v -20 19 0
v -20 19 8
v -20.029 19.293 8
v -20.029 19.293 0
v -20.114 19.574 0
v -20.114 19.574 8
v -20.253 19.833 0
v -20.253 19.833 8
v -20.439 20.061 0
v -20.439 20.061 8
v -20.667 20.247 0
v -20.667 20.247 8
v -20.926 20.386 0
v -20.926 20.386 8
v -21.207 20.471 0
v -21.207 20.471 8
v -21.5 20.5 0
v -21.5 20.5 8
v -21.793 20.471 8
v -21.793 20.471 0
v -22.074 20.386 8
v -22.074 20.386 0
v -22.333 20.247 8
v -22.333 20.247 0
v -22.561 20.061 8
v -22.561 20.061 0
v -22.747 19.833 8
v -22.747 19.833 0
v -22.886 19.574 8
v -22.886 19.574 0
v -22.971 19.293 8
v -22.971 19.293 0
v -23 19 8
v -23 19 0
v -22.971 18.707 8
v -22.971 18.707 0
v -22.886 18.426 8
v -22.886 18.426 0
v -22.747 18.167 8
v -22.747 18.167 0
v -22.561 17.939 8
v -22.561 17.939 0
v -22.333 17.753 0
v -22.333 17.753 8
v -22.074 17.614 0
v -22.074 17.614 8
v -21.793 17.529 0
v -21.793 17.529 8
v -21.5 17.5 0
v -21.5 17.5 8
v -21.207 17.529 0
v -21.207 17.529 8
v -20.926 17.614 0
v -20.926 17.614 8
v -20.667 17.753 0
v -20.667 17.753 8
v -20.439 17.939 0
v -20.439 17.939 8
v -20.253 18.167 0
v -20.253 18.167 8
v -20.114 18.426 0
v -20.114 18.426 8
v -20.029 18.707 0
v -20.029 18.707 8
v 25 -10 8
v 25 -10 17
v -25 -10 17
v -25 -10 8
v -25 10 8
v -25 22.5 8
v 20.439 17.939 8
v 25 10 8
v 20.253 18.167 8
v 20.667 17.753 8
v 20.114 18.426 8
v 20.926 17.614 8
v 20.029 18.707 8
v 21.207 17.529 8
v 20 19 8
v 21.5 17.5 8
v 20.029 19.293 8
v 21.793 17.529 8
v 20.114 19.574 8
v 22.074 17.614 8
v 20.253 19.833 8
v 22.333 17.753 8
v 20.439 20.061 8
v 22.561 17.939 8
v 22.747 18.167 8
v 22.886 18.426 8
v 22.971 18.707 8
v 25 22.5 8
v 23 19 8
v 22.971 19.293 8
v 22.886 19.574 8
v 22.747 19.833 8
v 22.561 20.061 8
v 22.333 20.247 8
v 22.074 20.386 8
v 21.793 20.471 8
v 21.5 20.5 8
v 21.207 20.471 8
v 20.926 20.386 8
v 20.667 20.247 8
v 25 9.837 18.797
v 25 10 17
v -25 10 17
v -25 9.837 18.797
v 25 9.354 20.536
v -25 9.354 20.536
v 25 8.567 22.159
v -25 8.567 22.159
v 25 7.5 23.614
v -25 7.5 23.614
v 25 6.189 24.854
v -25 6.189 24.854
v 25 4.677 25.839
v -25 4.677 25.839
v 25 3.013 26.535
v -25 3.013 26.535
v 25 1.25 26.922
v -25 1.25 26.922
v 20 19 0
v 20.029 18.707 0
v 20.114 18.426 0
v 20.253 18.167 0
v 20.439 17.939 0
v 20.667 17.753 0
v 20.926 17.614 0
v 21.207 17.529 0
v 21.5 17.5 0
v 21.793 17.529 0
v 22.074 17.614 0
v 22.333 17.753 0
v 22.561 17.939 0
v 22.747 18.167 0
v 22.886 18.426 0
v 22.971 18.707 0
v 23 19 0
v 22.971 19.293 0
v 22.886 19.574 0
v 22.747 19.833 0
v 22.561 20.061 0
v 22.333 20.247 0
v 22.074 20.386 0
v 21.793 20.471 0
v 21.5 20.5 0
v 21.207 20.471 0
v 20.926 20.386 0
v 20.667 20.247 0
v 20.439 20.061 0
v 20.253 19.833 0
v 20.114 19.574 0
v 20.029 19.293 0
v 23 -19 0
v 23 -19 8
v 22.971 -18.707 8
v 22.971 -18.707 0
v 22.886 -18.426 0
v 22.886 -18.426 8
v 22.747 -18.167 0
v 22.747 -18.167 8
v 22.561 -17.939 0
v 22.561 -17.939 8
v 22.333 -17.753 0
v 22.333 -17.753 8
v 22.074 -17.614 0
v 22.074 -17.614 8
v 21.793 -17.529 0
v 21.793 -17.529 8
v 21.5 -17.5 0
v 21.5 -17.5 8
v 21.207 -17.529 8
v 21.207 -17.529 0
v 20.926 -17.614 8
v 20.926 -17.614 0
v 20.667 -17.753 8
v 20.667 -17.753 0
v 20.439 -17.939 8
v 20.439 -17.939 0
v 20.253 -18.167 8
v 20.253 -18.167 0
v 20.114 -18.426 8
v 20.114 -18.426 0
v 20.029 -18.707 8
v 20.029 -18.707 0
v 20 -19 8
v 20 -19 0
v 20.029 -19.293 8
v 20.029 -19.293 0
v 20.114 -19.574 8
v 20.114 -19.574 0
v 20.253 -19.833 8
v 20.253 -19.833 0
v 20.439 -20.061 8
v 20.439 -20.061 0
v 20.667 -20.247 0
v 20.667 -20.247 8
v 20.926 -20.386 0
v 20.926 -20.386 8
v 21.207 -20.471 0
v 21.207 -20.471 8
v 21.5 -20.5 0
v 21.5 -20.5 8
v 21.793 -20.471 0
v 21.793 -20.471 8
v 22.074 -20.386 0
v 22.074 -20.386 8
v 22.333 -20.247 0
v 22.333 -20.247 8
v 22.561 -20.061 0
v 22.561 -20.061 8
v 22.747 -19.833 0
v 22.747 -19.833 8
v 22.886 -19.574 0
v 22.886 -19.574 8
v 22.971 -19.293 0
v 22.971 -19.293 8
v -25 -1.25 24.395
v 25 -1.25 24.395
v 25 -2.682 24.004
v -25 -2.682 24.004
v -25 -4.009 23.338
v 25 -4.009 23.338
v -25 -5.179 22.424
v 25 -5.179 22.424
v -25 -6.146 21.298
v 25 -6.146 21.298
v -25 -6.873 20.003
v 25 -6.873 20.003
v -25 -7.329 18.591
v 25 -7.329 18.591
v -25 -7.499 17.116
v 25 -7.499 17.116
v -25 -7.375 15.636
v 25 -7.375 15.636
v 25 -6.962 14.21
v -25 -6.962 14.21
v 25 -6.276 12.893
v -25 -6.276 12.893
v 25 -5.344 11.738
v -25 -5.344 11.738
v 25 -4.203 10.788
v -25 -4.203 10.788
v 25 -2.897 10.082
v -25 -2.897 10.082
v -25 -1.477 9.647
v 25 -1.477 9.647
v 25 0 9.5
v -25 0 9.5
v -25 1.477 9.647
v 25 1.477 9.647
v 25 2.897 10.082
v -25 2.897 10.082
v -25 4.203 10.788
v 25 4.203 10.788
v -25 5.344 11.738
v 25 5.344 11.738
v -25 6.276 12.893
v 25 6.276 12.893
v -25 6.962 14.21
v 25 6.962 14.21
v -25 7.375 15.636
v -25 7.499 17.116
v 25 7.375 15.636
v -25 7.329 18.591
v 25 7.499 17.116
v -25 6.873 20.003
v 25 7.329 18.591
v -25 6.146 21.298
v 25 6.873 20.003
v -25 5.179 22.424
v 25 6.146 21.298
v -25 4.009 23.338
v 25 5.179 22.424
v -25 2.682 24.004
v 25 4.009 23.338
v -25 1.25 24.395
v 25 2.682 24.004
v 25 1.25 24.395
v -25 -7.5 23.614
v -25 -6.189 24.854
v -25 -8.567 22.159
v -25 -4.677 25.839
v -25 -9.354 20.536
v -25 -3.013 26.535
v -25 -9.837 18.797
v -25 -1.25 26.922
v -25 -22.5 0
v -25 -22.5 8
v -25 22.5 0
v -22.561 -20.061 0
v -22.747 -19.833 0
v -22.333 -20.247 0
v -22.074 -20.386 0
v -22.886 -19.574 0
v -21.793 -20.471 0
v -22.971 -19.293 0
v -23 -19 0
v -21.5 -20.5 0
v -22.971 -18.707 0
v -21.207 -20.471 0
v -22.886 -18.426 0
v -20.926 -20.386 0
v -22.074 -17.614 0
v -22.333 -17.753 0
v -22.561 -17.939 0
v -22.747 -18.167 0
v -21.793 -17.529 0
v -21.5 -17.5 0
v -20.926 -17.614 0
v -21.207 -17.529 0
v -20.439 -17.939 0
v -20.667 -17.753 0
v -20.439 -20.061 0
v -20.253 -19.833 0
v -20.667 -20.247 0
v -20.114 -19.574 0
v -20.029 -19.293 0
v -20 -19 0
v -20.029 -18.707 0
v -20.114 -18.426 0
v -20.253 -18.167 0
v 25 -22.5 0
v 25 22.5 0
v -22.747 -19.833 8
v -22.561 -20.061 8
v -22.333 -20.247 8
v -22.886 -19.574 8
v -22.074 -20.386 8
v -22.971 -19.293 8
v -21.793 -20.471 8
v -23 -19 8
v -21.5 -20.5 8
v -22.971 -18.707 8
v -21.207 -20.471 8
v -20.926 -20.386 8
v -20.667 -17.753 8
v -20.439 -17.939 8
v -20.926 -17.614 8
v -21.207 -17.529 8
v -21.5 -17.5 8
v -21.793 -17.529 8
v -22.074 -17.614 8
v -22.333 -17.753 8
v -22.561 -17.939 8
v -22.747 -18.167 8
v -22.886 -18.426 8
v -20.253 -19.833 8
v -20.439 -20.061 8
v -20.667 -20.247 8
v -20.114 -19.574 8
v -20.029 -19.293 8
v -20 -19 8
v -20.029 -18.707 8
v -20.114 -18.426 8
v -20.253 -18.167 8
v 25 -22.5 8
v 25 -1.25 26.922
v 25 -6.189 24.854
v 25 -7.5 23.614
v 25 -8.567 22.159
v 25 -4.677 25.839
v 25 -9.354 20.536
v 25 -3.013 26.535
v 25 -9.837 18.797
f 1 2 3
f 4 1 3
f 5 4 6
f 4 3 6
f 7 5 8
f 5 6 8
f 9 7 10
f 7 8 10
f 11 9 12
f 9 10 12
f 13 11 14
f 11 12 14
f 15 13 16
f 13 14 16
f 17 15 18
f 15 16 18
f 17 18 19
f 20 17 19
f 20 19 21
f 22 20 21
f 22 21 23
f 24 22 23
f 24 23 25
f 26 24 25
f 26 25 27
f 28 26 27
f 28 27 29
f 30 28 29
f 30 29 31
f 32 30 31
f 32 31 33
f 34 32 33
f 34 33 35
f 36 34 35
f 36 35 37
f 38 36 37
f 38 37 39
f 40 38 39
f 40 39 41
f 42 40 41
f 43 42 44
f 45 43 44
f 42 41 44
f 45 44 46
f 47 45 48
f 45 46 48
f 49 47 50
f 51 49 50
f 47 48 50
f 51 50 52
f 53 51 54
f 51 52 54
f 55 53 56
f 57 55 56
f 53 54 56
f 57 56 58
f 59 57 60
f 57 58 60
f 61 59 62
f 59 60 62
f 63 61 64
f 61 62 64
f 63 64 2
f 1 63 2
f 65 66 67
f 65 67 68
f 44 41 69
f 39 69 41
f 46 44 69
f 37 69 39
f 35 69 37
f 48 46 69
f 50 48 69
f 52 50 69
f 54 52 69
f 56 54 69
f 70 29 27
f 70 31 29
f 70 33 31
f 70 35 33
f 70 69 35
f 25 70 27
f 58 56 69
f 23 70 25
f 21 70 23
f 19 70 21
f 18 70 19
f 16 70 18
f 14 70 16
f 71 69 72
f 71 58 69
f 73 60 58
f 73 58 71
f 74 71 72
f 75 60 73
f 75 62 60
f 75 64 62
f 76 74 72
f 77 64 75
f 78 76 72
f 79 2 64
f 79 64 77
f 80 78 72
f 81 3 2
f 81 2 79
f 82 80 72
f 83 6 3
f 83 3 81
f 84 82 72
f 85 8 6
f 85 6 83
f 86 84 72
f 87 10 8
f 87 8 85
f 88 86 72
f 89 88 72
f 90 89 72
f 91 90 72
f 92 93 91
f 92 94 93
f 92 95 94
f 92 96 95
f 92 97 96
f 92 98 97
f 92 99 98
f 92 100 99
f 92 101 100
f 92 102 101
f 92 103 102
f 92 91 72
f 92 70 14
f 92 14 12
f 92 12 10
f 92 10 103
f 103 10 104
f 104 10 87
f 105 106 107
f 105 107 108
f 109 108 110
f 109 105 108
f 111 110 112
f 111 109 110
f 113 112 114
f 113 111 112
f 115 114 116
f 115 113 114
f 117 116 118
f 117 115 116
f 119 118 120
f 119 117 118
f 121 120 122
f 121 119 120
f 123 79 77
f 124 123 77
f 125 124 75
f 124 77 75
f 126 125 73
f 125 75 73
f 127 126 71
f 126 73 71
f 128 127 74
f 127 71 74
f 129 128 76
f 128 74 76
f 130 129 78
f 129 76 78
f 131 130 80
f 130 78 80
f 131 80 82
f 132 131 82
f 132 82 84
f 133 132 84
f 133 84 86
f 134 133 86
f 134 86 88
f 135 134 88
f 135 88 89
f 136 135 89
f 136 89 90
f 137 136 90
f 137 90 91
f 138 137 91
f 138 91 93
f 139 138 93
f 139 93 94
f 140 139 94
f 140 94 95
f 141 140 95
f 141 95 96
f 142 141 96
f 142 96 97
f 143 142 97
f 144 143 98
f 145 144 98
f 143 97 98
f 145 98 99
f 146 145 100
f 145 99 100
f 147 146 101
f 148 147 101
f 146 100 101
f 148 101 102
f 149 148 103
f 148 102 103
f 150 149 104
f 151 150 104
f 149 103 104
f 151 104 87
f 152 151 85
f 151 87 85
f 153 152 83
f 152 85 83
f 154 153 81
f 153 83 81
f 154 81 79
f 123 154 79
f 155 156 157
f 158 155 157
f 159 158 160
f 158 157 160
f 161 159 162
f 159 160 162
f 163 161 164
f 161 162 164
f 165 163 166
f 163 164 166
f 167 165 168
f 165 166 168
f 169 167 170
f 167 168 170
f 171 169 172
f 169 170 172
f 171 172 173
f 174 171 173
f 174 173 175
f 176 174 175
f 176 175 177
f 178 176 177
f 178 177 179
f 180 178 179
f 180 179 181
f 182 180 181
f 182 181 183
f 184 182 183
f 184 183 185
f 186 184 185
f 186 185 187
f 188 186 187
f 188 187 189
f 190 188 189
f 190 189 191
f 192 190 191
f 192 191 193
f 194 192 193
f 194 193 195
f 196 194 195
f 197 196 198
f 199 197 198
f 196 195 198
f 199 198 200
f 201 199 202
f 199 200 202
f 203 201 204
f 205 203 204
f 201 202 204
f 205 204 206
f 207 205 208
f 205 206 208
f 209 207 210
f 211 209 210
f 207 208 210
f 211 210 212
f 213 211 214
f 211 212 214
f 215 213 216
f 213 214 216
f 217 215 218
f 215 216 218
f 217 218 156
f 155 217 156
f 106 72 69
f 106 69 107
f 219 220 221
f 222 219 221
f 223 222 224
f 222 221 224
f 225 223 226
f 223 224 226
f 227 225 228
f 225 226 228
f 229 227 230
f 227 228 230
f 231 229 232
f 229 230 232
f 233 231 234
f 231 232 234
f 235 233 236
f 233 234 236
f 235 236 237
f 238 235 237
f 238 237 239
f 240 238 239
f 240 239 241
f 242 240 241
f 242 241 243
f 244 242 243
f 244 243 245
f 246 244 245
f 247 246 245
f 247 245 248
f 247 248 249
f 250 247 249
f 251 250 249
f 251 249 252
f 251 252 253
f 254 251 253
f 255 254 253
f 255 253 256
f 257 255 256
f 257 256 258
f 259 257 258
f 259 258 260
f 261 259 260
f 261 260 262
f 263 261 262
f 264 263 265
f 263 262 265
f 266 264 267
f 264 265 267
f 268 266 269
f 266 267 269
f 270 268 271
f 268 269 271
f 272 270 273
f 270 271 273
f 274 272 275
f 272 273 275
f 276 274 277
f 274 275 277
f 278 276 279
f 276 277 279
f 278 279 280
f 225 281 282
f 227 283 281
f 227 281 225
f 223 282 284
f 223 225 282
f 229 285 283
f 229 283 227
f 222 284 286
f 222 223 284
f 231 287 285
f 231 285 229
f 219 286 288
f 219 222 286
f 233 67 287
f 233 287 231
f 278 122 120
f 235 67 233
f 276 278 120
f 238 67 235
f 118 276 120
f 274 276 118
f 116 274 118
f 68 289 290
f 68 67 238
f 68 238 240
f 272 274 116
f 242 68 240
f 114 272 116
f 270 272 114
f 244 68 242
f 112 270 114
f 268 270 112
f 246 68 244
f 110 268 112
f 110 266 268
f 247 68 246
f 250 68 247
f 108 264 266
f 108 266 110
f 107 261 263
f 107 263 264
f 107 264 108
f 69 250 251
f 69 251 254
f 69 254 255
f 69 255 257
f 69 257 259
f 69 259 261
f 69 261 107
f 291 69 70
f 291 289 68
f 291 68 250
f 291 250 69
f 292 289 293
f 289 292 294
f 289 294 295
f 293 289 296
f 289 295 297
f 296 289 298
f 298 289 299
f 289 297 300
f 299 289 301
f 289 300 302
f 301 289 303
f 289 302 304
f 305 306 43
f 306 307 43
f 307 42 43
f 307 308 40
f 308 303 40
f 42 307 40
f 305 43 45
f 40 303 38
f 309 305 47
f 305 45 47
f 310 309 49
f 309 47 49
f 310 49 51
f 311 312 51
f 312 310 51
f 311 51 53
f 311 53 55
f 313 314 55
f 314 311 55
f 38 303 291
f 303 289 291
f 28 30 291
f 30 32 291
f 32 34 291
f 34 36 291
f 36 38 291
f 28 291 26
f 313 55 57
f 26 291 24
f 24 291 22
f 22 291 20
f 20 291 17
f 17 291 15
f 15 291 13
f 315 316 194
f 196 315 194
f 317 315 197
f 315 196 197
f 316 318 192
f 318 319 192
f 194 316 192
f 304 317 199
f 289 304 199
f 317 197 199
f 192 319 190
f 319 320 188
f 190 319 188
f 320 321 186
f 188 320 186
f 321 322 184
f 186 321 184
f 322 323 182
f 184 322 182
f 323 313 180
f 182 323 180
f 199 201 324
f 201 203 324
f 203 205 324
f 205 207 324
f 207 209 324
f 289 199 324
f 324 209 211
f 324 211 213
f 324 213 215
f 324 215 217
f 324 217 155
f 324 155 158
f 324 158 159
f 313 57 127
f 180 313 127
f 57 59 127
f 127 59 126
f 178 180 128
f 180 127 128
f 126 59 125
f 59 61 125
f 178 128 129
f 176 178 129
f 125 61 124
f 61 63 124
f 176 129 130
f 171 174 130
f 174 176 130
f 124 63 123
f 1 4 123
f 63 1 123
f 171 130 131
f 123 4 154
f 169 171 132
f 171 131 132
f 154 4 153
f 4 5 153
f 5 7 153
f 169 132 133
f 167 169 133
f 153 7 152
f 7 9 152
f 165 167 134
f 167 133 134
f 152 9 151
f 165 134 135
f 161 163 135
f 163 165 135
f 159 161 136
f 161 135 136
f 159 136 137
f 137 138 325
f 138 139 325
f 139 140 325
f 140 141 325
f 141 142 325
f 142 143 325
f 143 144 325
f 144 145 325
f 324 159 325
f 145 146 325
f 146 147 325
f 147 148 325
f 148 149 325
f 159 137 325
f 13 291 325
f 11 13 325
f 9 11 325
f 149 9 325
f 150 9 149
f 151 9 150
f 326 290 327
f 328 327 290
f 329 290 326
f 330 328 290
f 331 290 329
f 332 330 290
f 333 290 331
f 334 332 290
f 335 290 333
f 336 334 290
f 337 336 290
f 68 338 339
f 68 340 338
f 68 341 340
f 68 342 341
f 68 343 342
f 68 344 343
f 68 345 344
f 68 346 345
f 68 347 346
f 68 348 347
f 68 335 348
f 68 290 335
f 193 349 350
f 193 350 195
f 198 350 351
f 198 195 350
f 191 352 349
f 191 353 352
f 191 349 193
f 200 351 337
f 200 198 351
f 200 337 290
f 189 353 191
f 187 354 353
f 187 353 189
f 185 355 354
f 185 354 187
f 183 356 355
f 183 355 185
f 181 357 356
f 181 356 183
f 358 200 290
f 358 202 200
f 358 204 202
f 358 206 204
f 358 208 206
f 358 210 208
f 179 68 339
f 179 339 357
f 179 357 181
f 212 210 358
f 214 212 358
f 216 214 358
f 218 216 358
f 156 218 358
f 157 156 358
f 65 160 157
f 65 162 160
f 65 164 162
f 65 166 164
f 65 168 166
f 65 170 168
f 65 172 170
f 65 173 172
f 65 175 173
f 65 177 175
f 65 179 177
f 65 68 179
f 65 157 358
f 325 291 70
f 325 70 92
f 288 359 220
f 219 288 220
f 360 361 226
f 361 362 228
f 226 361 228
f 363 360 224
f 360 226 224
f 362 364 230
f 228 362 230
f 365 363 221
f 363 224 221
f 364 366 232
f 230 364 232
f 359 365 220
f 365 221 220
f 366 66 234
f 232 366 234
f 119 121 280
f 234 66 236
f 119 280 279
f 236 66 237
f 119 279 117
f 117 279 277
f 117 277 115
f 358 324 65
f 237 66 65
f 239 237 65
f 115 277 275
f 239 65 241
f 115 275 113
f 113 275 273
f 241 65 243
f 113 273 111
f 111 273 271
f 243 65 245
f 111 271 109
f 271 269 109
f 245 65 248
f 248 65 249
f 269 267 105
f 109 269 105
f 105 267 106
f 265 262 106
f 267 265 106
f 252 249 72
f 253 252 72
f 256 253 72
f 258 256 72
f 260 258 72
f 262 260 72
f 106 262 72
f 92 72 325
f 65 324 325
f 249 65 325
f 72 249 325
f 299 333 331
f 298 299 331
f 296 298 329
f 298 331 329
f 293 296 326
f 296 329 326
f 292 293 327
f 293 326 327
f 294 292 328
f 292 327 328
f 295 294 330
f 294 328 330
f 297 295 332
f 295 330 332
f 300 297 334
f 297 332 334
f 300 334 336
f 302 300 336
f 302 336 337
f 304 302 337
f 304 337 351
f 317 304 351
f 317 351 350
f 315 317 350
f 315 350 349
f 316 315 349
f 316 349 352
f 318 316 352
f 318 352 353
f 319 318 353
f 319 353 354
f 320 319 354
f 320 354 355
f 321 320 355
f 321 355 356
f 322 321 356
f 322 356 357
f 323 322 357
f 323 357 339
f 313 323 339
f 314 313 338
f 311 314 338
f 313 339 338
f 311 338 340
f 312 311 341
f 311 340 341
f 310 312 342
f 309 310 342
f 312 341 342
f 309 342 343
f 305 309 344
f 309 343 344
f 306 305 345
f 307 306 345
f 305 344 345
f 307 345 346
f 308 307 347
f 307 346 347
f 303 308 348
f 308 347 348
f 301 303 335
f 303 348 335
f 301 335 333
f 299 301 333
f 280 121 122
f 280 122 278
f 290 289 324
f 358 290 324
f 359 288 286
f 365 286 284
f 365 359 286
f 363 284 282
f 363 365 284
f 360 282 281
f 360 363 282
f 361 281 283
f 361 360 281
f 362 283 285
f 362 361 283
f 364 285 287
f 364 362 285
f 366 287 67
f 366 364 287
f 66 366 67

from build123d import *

# Parameters (mm, degrees)
SKETCH_1_W          = 50
SKETCH_1_H          = 45
EXTRUDE_1_DEPTH     = 8
SKETCH_2_R          = 7.5
EXTRUDE_2_DEPTH     = 50
SKETCH_3_W          = 6
SKETCH_3_H          = 2.5
CUT_EXTRUDE_1_DEPTH = 58
SKETCH_5_R          = 1.5
CUT_EXTRUDE_2_DEPTH = 10


with BuildPart() as part:
    # 草图1 → 凸台-拉伸1 (new body)
    with BuildSketch(Plane.XY):
        Rectangle(SKETCH_1_W, SKETCH_1_H)
    extrude(amount=EXTRUDE_1_DEPTH)

    # 草图2 → 凸台-拉伸2 (add)
    with BuildSketch(Plane(origin=(25, 0, 0), x_dir=(0, 0, -1), z_dir=(1, 0, 0))):
        with BuildLine():
            Line((-8, 10), (-17, 10))
            ThreePointArc((-17, 10), (-27, 0), (-17, -10))
            Line((-17, -10), (-8, -10))
            Line((-8, -10), (-8, 10))
        make_face()
        with Locations((-17, 0)):
            Circle(SKETCH_2_R, mode=Mode.SUBTRACT)
    extrude(amount=-EXTRUDE_2_DEPTH)

    # 草图3 → 切除-拉伸1 (cut)
    with BuildSketch(Plane(origin=(25, 0, 0), x_dir=(0, 0, -1), z_dir=(1, 0, 0))):
        with Locations((-24.5, 0)):
            Rectangle(SKETCH_3_W, SKETCH_3_H)
    extrude(amount=-CUT_EXTRUDE_1_DEPTH, mode=Mode.SUBTRACT)

    # 草图5 → 切除-拉伸2 (cut)
    with BuildSketch(Plane.XY.offset(8)):
        with Locations((-21.5, 19)):
            Circle(SKETCH_5_R)
        with Locations(Location((21.5, 19, 0), (0, 0, 180))):
            Circle(SKETCH_5_R)
        with Locations((21.5, -19)):
            Circle(SKETCH_5_R)
        with Locations(Location((-21.5, -19, 0), (0, 0, 180))):
            Circle(SKETCH_5_R)
    extrude(amount=-CUT_EXTRUDE_2_DEPTH, mode=Mode.SUBTRACT)


solid = part.part
